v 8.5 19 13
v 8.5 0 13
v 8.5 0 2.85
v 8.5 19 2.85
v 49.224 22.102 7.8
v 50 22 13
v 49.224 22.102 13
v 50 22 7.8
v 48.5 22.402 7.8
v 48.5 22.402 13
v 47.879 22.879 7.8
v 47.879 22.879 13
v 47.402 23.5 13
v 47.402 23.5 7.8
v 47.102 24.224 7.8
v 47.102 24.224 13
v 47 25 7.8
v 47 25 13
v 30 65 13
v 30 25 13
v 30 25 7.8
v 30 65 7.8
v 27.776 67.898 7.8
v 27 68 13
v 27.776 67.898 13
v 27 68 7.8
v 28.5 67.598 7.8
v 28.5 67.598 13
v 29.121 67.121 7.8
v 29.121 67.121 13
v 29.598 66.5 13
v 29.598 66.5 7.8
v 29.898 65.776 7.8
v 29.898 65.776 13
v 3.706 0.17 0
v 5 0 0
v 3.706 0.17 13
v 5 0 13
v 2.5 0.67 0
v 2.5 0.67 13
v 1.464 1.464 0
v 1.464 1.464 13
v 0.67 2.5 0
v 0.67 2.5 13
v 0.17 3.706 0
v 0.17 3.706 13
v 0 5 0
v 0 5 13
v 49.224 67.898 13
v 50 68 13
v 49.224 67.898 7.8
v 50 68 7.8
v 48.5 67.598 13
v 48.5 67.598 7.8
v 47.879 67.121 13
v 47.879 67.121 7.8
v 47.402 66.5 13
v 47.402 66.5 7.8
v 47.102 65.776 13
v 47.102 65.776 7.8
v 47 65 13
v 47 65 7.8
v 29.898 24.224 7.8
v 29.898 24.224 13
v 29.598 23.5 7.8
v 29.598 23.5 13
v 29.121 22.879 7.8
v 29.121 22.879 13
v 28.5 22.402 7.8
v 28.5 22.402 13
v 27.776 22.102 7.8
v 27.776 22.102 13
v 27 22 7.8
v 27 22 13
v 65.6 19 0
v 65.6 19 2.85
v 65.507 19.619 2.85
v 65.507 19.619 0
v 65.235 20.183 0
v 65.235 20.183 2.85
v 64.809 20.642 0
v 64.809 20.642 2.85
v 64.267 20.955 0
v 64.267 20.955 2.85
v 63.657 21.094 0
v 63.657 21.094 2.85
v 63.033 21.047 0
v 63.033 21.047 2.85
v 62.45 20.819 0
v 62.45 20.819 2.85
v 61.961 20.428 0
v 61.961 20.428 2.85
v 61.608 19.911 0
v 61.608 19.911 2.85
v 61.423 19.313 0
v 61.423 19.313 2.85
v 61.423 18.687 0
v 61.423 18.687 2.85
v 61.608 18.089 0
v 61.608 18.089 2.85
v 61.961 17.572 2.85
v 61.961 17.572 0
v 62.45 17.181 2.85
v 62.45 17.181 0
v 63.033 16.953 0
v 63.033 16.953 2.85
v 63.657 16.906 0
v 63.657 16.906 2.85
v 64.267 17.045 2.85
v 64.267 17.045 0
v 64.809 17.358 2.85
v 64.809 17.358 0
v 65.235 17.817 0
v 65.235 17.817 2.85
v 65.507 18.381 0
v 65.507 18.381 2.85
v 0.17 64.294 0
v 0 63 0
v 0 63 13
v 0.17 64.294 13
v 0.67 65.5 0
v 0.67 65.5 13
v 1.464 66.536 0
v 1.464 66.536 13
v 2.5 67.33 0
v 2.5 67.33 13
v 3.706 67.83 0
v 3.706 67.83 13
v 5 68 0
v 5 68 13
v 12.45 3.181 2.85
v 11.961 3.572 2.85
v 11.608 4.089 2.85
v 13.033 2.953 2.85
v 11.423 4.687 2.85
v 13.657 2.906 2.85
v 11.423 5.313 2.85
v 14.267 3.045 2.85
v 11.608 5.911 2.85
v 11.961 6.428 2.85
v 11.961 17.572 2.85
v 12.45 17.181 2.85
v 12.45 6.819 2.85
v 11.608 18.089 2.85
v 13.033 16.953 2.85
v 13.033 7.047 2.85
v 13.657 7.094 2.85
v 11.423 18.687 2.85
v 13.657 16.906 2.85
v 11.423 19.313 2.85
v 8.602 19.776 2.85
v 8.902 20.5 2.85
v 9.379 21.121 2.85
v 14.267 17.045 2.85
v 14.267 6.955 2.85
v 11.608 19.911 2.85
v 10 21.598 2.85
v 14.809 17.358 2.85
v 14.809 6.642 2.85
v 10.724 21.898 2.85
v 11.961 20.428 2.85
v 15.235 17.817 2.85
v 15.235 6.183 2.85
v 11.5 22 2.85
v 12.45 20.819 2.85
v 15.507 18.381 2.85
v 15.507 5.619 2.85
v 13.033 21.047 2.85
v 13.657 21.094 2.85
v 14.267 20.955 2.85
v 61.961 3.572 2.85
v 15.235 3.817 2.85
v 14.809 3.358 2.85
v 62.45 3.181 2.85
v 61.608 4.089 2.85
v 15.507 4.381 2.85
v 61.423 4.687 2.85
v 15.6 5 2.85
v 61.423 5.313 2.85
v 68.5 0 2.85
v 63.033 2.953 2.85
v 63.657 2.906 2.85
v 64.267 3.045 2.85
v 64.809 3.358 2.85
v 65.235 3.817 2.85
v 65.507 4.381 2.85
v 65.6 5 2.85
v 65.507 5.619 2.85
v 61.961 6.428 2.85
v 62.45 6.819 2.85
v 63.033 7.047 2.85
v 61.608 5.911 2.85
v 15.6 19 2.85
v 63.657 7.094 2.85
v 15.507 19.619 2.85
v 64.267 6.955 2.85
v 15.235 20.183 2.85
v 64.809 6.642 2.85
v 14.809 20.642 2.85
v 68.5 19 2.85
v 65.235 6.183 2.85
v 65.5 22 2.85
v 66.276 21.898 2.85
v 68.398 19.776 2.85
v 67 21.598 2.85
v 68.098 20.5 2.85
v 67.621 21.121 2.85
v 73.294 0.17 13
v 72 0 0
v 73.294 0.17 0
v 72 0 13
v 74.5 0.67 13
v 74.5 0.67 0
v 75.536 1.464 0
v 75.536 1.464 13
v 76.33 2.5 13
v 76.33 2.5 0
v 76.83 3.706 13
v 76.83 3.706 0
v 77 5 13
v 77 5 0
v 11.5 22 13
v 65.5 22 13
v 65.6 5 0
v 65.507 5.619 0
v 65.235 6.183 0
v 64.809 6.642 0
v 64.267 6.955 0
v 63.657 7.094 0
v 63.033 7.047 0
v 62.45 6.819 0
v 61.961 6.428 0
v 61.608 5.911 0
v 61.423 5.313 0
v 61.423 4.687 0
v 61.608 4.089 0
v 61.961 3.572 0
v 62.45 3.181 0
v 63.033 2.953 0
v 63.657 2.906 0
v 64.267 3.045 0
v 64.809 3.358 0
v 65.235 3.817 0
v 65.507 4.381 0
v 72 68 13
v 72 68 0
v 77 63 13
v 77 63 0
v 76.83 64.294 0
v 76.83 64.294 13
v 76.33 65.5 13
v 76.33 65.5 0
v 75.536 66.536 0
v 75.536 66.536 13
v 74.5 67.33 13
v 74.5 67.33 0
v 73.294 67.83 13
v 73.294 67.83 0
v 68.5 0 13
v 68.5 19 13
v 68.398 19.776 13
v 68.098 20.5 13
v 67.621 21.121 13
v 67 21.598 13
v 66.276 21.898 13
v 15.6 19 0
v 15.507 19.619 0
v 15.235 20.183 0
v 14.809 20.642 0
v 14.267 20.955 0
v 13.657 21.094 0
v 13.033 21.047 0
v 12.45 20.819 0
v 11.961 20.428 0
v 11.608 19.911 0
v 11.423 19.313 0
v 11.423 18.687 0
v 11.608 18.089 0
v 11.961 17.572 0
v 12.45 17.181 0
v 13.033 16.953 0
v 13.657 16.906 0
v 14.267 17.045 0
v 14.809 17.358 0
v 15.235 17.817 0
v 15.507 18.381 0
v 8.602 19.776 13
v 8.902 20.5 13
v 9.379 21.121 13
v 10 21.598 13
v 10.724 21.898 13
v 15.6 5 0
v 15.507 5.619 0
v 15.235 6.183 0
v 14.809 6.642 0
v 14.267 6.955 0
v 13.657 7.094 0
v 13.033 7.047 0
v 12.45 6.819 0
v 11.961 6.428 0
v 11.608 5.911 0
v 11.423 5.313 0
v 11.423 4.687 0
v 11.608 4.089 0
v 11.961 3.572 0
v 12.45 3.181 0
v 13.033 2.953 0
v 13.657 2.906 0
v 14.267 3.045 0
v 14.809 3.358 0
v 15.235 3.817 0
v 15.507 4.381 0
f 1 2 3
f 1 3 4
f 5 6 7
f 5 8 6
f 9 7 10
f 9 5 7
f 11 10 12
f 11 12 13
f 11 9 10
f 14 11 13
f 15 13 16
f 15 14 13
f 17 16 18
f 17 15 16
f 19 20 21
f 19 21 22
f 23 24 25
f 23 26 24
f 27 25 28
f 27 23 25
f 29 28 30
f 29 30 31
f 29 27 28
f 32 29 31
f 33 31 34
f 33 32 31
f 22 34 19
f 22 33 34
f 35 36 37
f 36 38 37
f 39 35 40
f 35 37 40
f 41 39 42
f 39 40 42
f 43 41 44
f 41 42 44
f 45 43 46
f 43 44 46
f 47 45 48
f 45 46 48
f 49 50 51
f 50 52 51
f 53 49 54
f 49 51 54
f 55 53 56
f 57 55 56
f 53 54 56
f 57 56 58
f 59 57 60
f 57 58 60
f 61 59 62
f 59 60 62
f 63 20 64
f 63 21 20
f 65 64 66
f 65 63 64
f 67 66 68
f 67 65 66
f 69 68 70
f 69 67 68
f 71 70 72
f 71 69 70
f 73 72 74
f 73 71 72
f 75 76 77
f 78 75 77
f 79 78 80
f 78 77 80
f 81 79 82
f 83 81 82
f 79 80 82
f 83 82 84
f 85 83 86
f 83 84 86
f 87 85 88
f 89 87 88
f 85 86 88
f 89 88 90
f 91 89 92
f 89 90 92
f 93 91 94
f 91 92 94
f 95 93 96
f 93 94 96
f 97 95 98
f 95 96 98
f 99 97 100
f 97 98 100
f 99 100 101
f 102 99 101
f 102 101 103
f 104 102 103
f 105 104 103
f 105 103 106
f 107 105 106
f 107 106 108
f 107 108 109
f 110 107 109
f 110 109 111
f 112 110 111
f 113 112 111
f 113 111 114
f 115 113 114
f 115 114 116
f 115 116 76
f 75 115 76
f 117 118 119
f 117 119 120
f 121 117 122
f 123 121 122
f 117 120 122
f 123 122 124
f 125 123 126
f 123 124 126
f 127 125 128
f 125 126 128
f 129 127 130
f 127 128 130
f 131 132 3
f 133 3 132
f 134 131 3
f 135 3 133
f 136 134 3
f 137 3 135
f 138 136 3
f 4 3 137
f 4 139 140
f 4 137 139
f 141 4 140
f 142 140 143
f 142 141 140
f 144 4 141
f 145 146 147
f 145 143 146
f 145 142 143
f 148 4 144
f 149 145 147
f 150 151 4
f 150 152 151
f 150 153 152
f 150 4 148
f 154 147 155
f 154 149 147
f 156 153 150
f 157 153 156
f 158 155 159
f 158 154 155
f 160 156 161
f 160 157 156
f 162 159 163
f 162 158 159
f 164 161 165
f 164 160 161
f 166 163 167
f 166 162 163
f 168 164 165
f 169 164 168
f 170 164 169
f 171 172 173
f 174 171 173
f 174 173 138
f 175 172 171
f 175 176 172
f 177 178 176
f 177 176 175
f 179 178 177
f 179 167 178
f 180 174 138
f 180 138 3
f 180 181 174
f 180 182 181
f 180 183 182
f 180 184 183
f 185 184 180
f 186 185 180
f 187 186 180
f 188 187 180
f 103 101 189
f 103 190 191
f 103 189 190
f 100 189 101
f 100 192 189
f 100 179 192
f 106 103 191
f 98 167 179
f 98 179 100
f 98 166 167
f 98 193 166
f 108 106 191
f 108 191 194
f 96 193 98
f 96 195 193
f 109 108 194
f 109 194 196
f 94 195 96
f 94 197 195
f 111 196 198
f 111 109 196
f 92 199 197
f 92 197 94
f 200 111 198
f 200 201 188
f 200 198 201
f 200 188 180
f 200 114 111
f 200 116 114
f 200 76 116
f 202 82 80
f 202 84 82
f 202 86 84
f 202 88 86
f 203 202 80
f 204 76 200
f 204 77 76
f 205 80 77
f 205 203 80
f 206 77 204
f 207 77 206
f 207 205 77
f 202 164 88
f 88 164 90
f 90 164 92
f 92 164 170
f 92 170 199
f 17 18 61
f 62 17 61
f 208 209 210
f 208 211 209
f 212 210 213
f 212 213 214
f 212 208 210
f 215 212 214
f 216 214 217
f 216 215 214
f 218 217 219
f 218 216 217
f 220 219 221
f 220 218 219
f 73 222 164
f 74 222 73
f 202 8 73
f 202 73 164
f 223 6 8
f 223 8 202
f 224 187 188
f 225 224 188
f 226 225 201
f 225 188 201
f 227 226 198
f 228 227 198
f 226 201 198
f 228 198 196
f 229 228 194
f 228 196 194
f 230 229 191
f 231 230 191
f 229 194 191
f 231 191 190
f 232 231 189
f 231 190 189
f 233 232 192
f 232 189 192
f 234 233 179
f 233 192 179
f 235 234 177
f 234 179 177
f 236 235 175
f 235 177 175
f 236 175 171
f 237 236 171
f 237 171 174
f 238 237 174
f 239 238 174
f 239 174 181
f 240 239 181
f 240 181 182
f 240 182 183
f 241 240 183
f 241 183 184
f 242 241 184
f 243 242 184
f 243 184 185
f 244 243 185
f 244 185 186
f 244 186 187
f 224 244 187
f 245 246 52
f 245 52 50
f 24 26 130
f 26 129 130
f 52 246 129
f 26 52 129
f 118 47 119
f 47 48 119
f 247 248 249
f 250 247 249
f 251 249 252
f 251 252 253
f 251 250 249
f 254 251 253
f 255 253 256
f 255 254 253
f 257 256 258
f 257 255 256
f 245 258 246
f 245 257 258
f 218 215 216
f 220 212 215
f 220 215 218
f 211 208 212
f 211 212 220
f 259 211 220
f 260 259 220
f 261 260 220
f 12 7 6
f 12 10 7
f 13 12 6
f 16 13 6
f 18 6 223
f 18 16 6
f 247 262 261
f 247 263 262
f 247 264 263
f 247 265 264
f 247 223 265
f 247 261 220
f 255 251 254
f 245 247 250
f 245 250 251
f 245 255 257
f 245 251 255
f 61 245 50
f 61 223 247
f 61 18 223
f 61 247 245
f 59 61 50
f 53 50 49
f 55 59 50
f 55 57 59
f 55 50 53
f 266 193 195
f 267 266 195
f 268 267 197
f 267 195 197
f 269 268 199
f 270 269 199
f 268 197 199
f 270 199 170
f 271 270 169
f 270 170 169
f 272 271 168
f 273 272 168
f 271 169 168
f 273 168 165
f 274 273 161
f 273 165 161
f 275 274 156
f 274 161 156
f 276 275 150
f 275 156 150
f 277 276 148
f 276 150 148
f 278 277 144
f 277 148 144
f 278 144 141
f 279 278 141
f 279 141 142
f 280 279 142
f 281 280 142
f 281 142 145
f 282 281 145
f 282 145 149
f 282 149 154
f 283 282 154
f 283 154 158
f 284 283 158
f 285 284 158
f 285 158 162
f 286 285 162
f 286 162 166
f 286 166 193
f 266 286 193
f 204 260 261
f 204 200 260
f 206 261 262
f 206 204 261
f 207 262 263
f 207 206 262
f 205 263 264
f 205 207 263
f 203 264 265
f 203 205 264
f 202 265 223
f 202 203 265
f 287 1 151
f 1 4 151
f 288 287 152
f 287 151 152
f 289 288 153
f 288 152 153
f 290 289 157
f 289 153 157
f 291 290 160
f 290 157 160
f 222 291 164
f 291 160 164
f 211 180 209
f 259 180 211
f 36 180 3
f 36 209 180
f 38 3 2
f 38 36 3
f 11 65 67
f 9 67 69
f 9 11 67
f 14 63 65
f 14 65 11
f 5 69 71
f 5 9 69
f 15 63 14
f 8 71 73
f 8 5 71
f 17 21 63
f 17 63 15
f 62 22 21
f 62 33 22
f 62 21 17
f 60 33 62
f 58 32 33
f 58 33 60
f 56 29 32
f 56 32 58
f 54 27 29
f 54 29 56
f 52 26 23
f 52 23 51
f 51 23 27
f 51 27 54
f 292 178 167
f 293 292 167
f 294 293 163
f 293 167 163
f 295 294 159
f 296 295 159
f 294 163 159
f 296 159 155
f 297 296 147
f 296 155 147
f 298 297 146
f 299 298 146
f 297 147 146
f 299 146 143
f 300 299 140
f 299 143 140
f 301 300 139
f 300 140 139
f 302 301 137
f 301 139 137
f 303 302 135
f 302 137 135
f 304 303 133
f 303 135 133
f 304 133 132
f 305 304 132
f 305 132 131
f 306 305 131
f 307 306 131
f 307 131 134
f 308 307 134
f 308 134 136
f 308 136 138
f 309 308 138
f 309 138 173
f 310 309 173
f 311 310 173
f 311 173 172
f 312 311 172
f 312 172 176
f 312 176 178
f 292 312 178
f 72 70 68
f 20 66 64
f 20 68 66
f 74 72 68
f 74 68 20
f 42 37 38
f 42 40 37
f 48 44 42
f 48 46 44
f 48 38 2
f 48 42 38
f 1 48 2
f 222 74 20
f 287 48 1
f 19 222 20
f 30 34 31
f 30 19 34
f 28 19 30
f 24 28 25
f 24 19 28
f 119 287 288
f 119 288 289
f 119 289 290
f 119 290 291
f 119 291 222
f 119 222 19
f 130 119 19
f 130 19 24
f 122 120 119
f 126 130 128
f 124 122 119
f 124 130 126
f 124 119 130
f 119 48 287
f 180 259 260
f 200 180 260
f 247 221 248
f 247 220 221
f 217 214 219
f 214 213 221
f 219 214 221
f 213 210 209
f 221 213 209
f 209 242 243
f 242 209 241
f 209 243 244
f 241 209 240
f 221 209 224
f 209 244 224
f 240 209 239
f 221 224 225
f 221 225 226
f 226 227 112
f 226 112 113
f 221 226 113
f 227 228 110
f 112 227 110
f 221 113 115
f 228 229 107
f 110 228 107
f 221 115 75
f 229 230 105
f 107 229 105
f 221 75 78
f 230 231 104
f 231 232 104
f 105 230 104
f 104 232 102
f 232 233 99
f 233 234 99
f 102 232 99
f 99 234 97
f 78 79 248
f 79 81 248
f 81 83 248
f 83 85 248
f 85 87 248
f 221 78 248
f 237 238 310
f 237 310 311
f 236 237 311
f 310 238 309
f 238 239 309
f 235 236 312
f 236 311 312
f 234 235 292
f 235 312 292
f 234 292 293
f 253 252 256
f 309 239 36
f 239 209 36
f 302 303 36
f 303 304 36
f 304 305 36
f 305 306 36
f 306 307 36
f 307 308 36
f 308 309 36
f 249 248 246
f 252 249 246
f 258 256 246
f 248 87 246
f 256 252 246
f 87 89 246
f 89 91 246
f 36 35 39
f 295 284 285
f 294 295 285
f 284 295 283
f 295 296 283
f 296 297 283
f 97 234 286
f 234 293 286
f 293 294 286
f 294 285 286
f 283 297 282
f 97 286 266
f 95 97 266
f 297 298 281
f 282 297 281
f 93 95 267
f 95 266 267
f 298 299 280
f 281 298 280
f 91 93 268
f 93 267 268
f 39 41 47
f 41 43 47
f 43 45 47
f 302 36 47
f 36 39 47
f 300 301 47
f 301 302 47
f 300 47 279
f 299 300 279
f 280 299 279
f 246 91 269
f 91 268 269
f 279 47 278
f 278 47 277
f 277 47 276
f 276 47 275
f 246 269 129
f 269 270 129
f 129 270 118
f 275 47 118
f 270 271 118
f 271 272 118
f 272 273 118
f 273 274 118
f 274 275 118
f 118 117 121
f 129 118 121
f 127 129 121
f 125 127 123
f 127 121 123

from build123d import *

# Parameters (mm, degrees)
SKETCH_1_W          = 68
SKETCH_1_H          = 13
EXTRUDE_1_DEPTH     = 77
SKETCH_2_W          = 60
SKETCH_2_H          = 22
CUT_EXTRUDE_1_DEPTH = 10.15
FILLET_1_R          = 5
SKETCH_3_W          = 17
SKETCH_3_H          = 46
CUT_EXTRUDE_2_DEPTH = 5.2
FILLET_2_R          = 3
SKETCH_5_R          = 2.1
CUT_EXTRUDE_4_DEPTH = 4.6


with BuildPart() as part:
    # 草图1 → 凸台-拉伸1 (new body)
    with BuildSketch(Plane.YZ):
        with Locations((34, 6.5)):
            Rectangle(SKETCH_1_W, SKETCH_1_H)
    extrude(amount=EXTRUDE_1_DEPTH)

    # 草图2 → 切除-拉伸1 (cut)
    with BuildSketch(Plane.XY.offset(13)):
        with Locations((38.5, 11)):
            Rectangle(SKETCH_2_W, SKETCH_2_H)
    extrude(amount=-CUT_EXTRUDE_1_DEPTH, mode=Mode.SUBTRACT)

    # 圆角1
    fillet_1_edges = [part.edges().sort_by_distance(p)[0] for p in [
        (77, 68, 6.5),
        (77, 0, 6.5),
        (0, 68, 6.5),
        (0, 0, 6.5),
    ]]
    fillet(fillet_1_edges, radius=FILLET_1_R)

    # 草图3 → 切除-拉伸2 (cut)
    with BuildSketch(Plane.XY.offset(13)):
        with Locations((38.5, 45)):
            Rectangle(SKETCH_3_W, SKETCH_3_H)
    extrude(amount=-CUT_EXTRUDE_2_DEPTH, mode=Mode.SUBTRACT)

    # 圆角2
    fillet_2_edges = [part.edges().sort_by_distance(p)[0] for p in [
        (8.5, 22, 7.925),
        (68.5, 22, 7.925),
        (30, 22, 10.4),
        (30, 68, 10.4),
        (47, 68, 10.4),
        (47, 22, 10.4),
    ]]
    fillet(fillet_2_edges, radius=FILLET_2_R)

    # 草图5 → 切除-拉伸4 (cut)
    with BuildSketch(Plane.XY.offset(2.85)):
        with Locations((63.5, 5)):
            Circle(SKETCH_5_R)
        with Locations((13.5, 5)):
            Circle(SKETCH_5_R)
        with Locations((13.5, 19)):
            Circle(SKETCH_5_R)
        with Locations((63.5, 19)):
            Circle(SKETCH_5_R)
    extrude(amount=-CUT_EXTRUDE_4_DEPTH, mode=Mode.SUBTRACT)


solid = part.part
